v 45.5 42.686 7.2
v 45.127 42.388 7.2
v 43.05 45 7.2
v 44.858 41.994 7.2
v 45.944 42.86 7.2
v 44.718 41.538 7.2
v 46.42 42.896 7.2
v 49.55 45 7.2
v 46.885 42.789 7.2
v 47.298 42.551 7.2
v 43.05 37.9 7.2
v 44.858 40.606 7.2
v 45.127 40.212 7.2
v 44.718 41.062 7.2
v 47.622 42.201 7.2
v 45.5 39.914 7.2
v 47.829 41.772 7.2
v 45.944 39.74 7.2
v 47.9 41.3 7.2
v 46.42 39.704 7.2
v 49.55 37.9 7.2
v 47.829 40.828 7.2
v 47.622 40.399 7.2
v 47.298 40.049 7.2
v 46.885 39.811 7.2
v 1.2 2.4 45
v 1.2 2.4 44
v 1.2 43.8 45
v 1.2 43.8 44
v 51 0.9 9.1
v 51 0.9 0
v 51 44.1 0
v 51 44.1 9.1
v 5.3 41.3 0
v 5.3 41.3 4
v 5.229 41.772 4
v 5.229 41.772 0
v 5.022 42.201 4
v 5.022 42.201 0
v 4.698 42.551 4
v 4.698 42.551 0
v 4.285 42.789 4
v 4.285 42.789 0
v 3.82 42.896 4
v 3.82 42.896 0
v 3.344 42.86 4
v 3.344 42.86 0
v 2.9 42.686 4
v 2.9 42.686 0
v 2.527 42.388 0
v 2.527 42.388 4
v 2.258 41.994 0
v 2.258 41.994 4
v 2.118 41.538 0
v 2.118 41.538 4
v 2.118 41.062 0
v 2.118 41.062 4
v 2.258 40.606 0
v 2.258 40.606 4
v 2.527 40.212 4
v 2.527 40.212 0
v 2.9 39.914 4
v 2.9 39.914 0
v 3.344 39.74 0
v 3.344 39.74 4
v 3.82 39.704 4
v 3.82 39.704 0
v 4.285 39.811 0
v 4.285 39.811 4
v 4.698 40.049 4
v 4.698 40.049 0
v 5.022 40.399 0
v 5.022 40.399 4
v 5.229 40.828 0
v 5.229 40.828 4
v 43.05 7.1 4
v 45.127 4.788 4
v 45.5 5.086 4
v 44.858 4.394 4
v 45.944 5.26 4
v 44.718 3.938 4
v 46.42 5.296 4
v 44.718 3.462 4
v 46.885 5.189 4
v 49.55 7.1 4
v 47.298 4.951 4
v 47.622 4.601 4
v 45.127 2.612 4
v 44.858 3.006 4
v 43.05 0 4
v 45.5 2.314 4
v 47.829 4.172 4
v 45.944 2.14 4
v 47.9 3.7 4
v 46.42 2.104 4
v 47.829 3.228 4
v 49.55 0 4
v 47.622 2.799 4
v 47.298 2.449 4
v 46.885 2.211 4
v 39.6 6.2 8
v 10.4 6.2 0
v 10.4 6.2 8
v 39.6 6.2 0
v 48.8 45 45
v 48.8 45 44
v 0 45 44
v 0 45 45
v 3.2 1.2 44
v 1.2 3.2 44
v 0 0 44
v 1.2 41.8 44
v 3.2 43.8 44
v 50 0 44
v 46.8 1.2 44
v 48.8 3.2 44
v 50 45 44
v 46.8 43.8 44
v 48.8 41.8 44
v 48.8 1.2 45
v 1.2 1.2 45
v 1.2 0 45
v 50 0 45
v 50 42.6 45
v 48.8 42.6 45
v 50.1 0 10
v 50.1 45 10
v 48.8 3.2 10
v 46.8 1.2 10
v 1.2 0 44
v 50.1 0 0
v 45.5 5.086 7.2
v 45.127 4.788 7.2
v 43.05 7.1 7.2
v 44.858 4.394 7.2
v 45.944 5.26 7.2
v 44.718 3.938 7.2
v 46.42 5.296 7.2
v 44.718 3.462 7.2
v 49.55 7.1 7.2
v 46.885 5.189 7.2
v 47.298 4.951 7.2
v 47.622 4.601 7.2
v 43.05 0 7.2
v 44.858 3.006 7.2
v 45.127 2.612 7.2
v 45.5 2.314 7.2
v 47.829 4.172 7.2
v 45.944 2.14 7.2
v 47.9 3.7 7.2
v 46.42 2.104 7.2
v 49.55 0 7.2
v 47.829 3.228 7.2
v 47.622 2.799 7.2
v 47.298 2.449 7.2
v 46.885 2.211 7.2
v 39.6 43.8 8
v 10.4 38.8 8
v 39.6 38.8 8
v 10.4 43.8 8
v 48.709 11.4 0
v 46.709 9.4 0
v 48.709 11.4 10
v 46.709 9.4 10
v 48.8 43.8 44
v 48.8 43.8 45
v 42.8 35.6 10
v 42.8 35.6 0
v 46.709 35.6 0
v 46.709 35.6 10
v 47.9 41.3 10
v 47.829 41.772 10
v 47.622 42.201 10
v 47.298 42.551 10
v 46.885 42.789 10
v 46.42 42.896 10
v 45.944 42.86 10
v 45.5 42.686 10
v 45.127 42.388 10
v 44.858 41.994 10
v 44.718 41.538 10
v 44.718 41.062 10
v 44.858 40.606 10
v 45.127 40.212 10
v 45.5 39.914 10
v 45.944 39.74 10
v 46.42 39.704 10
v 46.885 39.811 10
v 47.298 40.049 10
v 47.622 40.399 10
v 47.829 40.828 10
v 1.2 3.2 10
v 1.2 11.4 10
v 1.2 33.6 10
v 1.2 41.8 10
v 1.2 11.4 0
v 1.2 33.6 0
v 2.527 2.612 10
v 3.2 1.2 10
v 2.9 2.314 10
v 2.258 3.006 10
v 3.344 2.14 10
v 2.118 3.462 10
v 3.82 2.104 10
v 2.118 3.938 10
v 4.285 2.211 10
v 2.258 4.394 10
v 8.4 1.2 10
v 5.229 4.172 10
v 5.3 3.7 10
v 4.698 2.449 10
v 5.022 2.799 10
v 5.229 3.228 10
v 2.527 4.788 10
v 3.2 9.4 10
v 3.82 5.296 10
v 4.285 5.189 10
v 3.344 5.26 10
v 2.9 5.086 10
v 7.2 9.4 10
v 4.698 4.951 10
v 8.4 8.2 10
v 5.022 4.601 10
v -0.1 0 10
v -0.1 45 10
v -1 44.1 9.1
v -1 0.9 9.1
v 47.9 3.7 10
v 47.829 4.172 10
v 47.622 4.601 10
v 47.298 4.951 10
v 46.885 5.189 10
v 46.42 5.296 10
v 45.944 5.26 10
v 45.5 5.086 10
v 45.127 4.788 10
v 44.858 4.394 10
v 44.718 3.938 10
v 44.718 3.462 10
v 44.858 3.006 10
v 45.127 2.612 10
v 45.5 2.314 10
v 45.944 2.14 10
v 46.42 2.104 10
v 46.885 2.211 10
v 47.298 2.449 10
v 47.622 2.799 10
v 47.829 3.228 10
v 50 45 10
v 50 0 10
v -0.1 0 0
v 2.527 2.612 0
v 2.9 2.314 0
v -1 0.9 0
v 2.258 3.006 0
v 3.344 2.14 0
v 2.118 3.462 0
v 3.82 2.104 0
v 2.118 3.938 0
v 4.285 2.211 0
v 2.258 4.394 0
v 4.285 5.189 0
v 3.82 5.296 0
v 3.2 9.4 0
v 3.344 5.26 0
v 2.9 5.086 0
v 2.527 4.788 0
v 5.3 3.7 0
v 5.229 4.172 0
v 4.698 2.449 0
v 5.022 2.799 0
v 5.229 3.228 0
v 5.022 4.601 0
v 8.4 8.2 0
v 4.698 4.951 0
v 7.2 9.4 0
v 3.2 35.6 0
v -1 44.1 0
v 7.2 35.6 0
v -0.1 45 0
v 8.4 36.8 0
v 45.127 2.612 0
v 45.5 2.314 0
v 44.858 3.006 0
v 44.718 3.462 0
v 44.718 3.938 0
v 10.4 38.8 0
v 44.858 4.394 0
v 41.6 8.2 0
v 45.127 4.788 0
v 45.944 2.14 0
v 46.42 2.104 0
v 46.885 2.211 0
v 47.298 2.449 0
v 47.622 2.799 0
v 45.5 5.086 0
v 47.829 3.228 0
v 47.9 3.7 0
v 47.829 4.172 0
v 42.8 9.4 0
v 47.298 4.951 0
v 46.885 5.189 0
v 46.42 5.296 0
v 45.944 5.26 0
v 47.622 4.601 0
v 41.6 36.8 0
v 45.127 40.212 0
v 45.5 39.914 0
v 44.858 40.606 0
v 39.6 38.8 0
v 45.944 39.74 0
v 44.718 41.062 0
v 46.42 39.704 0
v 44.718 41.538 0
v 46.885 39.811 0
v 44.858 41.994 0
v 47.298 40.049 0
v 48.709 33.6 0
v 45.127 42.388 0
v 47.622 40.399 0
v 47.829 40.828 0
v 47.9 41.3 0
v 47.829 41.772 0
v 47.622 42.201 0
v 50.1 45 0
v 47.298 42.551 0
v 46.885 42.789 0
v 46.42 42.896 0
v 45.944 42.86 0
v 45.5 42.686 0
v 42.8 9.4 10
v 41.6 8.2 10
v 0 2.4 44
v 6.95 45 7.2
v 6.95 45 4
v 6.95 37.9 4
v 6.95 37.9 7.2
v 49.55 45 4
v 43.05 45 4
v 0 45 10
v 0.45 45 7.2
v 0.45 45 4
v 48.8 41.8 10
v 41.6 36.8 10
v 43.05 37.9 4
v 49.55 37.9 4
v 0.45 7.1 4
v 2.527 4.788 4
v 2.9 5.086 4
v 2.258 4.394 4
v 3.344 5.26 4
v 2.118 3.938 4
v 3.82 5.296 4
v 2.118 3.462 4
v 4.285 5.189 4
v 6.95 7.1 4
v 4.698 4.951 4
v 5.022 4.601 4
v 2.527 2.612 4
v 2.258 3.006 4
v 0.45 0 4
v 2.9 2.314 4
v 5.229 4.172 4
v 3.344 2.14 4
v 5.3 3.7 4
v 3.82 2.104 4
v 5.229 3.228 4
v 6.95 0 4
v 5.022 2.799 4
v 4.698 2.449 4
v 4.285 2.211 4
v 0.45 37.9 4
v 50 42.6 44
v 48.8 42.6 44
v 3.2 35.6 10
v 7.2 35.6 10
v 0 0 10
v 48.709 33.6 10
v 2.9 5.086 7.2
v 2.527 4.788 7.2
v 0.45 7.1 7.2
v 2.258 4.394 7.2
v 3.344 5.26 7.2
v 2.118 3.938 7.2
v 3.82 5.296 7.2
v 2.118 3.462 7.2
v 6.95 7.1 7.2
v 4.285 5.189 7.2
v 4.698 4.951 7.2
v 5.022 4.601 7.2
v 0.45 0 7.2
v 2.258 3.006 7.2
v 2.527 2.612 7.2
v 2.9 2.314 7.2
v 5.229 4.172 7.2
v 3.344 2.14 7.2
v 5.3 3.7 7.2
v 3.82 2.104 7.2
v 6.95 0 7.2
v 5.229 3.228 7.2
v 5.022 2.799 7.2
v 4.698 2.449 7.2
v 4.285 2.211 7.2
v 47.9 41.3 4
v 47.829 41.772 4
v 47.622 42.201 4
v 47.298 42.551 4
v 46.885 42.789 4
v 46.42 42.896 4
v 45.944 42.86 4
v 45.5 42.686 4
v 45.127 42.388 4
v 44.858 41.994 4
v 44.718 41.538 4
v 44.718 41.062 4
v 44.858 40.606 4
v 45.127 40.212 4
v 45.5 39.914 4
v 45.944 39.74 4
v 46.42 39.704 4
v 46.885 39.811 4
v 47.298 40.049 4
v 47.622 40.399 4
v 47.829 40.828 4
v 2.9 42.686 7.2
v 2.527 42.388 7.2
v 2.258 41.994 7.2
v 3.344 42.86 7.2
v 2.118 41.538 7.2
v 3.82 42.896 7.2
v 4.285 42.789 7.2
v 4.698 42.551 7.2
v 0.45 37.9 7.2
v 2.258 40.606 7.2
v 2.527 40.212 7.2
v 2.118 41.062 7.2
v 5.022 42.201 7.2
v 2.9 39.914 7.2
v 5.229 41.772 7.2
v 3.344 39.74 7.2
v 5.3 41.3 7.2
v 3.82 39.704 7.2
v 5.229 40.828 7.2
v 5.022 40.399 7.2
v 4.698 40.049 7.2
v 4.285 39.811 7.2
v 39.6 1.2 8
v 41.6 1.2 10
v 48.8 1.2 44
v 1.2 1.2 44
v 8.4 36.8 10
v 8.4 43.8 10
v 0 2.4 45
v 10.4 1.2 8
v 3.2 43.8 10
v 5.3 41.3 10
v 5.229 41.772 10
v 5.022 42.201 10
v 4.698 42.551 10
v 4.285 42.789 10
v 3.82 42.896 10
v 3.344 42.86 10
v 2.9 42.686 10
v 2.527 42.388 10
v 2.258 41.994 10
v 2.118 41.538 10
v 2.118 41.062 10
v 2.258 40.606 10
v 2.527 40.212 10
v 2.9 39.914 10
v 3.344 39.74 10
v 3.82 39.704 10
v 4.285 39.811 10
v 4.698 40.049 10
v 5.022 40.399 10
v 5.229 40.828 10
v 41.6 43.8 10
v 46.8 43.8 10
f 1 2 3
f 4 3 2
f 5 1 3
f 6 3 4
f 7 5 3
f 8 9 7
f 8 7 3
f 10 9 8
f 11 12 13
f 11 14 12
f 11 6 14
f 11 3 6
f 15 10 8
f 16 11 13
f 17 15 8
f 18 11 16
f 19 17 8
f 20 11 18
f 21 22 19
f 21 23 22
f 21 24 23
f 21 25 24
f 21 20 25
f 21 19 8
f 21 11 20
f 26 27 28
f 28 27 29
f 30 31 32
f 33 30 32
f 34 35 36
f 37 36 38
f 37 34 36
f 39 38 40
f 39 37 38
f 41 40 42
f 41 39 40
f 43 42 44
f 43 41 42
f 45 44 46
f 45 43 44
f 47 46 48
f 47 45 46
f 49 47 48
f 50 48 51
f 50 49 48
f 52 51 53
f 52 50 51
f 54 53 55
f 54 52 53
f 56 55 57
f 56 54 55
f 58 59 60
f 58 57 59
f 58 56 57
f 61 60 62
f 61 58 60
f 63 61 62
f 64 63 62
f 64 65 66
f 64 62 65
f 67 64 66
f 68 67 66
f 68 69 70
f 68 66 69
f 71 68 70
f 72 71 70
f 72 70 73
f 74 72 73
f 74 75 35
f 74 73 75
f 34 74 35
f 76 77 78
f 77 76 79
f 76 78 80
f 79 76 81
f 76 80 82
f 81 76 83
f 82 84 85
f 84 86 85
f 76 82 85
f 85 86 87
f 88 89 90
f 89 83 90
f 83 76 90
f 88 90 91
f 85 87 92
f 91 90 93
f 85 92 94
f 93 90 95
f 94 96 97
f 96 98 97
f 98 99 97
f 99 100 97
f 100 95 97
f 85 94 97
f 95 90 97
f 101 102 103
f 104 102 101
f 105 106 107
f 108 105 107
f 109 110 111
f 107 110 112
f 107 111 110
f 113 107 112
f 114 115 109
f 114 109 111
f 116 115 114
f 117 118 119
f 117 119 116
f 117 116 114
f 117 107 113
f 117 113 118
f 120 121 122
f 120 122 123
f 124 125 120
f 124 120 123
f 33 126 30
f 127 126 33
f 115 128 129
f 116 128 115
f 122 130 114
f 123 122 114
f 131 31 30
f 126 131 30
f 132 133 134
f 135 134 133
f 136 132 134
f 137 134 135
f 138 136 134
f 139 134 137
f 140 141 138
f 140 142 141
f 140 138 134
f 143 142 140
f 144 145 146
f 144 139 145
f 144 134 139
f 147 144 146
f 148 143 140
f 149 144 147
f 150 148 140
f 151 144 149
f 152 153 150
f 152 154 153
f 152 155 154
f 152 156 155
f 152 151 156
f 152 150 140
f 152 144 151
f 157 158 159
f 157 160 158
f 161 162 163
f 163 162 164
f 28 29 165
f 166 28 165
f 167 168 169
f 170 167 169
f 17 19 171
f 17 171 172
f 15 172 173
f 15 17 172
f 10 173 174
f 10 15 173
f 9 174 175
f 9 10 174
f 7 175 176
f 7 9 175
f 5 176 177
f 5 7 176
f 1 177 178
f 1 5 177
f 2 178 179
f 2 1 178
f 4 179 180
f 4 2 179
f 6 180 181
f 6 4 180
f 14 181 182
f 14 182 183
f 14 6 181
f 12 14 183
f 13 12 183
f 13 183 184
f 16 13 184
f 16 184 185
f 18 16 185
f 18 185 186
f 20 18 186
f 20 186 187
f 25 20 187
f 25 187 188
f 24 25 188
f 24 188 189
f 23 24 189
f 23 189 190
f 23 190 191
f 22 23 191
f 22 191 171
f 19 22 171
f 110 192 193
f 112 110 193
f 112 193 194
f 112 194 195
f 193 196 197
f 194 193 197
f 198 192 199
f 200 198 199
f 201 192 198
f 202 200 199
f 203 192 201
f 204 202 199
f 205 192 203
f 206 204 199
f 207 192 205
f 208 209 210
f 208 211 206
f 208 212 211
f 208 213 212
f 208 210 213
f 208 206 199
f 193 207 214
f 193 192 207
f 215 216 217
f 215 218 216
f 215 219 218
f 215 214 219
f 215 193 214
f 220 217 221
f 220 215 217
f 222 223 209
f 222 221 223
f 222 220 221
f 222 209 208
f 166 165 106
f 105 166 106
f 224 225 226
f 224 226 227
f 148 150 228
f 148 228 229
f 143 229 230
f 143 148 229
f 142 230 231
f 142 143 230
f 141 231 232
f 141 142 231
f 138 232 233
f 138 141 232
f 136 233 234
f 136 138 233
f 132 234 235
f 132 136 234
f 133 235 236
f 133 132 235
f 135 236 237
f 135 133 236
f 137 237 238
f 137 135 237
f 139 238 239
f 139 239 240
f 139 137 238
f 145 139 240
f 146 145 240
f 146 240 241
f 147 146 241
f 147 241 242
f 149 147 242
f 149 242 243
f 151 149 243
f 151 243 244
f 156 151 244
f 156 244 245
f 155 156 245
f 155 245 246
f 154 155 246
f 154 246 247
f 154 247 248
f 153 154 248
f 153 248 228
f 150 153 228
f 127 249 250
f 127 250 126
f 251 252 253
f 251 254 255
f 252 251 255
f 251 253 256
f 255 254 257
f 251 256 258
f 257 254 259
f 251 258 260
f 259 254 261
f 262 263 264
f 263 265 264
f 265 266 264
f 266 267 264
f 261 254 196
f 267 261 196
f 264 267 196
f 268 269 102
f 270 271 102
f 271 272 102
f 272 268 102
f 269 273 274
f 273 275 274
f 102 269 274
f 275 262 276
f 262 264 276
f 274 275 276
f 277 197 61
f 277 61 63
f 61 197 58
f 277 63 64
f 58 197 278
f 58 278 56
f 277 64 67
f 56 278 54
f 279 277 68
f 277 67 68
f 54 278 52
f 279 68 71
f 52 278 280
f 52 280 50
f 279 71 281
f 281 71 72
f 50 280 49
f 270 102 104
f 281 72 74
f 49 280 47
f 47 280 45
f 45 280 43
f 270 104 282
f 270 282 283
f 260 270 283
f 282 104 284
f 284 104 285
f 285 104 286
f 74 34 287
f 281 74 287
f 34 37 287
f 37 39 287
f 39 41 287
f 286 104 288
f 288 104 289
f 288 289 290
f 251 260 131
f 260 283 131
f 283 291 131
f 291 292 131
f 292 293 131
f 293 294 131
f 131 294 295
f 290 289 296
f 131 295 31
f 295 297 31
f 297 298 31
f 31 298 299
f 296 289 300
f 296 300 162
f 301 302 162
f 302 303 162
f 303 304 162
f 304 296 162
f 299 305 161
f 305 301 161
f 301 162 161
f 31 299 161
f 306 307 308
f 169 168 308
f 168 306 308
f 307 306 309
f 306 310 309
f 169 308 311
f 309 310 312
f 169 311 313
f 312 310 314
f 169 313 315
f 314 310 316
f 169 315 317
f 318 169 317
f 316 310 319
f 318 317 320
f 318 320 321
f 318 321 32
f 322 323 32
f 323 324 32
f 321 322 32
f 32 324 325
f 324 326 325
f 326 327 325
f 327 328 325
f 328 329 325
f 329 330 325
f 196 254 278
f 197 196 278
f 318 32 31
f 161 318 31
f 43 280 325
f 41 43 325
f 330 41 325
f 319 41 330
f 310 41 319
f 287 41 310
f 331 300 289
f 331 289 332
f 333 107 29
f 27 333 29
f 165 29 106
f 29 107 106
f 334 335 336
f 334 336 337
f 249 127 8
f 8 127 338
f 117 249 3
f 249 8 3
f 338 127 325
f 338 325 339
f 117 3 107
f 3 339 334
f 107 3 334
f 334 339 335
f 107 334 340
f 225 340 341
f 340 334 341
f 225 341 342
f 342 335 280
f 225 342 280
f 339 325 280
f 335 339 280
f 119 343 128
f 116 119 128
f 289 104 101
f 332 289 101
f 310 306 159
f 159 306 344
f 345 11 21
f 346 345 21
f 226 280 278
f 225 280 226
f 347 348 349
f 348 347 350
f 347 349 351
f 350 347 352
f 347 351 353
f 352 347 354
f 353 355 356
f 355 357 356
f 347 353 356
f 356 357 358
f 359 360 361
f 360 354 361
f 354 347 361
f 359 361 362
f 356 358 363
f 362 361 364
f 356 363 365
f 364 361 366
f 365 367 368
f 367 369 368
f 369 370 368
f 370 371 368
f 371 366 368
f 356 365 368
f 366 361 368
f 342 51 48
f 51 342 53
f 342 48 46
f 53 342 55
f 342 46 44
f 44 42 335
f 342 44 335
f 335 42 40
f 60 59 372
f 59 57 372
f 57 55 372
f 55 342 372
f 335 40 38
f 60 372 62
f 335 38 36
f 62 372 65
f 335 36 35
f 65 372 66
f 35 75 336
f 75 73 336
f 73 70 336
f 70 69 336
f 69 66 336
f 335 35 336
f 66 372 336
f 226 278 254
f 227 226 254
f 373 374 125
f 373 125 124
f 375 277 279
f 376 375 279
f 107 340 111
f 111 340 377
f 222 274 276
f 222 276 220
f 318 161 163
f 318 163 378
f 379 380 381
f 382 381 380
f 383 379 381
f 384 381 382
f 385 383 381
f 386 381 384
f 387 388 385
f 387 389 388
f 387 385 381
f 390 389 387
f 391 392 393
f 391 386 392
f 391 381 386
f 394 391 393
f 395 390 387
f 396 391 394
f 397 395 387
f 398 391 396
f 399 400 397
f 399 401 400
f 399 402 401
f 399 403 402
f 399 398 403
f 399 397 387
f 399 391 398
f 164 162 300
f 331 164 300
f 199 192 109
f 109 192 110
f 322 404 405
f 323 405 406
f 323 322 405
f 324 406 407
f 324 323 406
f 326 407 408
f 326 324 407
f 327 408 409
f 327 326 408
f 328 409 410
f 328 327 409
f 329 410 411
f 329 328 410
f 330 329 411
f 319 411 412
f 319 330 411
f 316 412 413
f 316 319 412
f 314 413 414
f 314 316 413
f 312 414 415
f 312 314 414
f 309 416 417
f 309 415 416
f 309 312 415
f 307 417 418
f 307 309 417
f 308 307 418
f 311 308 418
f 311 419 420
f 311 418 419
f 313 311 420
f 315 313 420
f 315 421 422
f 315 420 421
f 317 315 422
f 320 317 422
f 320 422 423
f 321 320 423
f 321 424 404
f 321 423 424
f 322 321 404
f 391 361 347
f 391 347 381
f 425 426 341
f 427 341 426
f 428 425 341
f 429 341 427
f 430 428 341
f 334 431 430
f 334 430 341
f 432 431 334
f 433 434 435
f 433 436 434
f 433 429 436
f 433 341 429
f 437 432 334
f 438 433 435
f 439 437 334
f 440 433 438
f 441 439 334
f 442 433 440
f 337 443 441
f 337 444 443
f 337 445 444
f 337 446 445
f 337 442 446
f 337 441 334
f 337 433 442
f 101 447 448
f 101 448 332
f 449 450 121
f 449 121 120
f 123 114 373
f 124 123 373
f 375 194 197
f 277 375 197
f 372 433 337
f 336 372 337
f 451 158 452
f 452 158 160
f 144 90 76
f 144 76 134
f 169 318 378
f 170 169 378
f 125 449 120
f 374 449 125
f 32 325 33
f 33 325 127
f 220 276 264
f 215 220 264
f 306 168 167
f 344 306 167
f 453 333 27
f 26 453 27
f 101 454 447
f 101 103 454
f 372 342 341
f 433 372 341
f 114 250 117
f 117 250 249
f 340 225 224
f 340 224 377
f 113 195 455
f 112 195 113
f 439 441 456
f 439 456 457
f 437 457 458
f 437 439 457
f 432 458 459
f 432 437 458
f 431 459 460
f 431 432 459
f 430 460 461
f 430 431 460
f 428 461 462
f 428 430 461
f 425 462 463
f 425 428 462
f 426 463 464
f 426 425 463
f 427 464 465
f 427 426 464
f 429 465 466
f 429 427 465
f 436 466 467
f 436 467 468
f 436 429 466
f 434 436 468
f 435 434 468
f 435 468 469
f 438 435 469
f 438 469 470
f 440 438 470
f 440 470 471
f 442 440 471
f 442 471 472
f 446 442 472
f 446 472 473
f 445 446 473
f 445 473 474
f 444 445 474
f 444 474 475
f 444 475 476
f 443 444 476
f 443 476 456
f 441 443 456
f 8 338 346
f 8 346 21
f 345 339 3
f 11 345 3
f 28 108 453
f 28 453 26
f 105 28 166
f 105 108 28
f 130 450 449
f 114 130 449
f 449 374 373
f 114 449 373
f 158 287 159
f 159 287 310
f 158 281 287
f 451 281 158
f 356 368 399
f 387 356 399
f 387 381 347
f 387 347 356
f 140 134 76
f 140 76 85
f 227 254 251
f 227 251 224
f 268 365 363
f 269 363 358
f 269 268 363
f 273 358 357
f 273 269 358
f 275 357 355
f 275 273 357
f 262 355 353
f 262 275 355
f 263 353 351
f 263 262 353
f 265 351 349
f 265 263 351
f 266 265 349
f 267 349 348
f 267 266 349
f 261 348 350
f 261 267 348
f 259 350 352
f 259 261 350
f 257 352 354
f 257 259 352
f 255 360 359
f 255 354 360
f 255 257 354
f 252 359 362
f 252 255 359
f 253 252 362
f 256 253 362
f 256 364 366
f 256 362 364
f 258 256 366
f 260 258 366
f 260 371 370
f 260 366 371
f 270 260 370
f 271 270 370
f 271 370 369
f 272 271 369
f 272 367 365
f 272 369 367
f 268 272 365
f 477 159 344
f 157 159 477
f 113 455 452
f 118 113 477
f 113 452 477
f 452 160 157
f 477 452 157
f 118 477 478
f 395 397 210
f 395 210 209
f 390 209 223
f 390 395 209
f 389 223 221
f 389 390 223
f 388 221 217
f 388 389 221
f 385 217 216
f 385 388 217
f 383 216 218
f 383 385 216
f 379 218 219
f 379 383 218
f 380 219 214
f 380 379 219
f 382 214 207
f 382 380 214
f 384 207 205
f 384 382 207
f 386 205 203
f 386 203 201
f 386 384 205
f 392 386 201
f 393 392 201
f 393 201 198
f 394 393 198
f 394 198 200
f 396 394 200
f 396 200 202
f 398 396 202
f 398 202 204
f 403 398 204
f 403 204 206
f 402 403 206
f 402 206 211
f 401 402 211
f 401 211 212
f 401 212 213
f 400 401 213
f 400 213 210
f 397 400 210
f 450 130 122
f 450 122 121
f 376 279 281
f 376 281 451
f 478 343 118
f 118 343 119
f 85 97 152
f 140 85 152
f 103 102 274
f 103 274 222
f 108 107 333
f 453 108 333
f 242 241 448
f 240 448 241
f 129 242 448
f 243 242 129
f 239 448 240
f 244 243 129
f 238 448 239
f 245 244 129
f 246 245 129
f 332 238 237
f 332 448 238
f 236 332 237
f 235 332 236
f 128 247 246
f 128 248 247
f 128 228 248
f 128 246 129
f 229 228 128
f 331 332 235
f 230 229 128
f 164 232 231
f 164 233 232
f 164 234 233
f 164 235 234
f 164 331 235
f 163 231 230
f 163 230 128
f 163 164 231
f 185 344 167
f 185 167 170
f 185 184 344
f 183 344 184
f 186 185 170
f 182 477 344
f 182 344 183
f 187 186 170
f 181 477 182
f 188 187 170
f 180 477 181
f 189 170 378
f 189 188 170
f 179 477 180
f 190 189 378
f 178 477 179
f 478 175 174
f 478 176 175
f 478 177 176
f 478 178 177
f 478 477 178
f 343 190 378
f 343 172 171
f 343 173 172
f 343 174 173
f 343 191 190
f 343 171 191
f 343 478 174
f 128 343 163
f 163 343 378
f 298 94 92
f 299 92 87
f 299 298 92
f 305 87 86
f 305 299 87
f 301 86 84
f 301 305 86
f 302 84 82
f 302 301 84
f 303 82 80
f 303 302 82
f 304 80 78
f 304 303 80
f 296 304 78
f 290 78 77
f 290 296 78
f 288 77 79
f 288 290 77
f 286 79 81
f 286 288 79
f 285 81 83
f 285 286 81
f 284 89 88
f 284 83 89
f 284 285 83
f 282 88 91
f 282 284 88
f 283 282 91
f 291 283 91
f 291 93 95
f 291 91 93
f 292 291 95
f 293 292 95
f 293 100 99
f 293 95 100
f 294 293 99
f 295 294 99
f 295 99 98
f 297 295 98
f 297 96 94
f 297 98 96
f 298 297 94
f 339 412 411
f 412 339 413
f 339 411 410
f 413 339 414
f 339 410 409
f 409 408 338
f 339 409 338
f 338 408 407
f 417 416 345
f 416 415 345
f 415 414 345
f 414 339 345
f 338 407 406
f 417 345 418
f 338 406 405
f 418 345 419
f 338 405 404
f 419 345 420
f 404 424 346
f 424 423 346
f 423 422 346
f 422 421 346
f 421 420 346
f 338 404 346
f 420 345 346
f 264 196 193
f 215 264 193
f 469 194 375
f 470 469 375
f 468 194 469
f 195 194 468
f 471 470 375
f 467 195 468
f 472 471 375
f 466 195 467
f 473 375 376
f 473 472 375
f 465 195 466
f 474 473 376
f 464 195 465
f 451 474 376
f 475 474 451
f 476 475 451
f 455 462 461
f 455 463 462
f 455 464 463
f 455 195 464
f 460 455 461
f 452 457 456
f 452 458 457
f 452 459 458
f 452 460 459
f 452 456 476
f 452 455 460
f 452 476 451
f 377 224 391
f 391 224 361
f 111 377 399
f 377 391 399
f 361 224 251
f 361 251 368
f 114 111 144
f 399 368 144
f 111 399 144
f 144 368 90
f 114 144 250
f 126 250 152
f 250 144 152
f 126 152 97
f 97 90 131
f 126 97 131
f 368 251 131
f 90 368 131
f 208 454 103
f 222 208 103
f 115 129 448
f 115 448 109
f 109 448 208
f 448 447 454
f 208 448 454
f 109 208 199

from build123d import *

# Parameters (mm, degrees)
F0_W      = 47.6
F0_H      = 1.2
F0_W_2    = 1.2
F0_H_2    = 42.6
F1_DEPTH  = 44
F2_R      = 1.6
F2_W      = 1.4791749234
F2_H      = 26.2
F2_W_2    = 2.291076839
F3_DEPTH  = 10
F4_W      = 6.5
F4_H      = 3.2
F5_DEPTH  = 7.1
F6_START  = -37.9
F6_DEPTH  = 7.1
F7_SIZE   = 0.9
F8_W      = 47.6
F8_H      = 1.2
F8_W_2    = 1.2
F8_H_2    = 41.4
F9_DEPTH  = 1
F10_W     = 33.2
F10_H     = 5
F11_DEPTH = 8
F12_SIZE  = 1.99999
F13_SIZE  = 2
F14_SIZE  = 1.2


# Not quite as in the source:
# - a fillet or chamfer is up to 0.001 mm smaller than in the source, because OpenCascade refuses the exact size


with BuildPart() as f1:
    # F0 (on Top) → F1 (new body)
    with BuildSketch(Plane.XY):
        with Locations((25, 44.4)):
            Rectangle(F0_W, F0_H)
        with Locations((49.4, 44.4)):
            Rectangle(F0_W_2, F0_H)
        with Locations((49.4, 22.5)):
            Rectangle(F0_W_2, F0_H_2)
        with Locations((49.4, 0.6)):
            Rectangle(F0_W_2, F0_H)
        with Locations((25, 0.6)):
            Rectangle(F0_W, F0_H)
        with Locations((0.6, 0.6)):
            Rectangle(F0_W_2, F0_H)
        with Locations((0.6, 22.5)):
            Rectangle(F0_W_2, F0_H_2)
        with Locations((0.6, 44.4)):
            Rectangle(F0_W_2, F0_H)
    extrude(amount=F1_DEPTH)

    # F2 (on face) → F3 (join)
    with BuildSketch(Plane.XY):
        Polygon((-1, 9.4), (-1, 0), (8.4, 0), (8.4, 9.4), (0.4791749234, 9.4), align=None)
        with Locations((3.7, 3.7)):
            Circle(F2_R, mode=Mode.SUBTRACT)
        with Locations((-0.2604125383, 22.5)):
            Rectangle(F2_W, F2_H)
        Polygon((-1, 45), (-1, 35.6), (0.4791749234, 35.6), (8.4, 35.6), (8.4, 45), align=None)
        with Locations((3.7, 41.3)):
            Circle(F2_R, mode=Mode.SUBTRACT)
        Polygon((41.6, 9.4), (41.6, 0), (51, 0), (51, 9.4), (48.708923161, 9.4), align=None)
        with Locations((46.3, 3.7)):
            Circle(F2_R, mode=Mode.SUBTRACT)
        with Locations((49.8544615805, 22.5)):
            Rectangle(F2_W_2, F2_H)
        Polygon((41.6, 35.6), (48.708923161, 35.6), (51, 35.6), (51, 45), (41.6, 45), align=None)
        with Locations((46.3, 41.3)):
            Circle(F2_R, mode=Mode.SUBTRACT)
    extrude(amount=F3_DEPTH)

    # F4 (on face) → F5 (cut)
    with BuildSketch(Plane.XZ):
        with Locations((3.7, 5.6)):
            Rectangle(F4_W, F4_H)
        with Locations((46.3, 5.6)):
            Rectangle(F4_W, F4_H)
    extrude(amount=-F5_DEPTH, mode=Mode.SUBTRACT)

    # F4 (on face) → F6 (cut)
    with BuildSketch(Plane.XZ.offset(F6_START)):
        with Locations((3.7, 5.6)):
            Rectangle(F4_W, F4_H)
        with Locations((46.3, 5.6)):
            Rectangle(F4_W, F4_H)
    extrude(amount=-F6_DEPTH, mode=Mode.SUBTRACT)

    # F7
    f7_edges = [f1.edges().sort_by_distance(p)[0] for p in [
        (-1, 45, 5),
        (-1, 22.5, 10),
        (51, 22.5, 10),
        (-1, 0, 5),
        (51, 0, 5),
        (51, 45, 5),
    ]]
    chamfer(f7_edges, length=F7_SIZE)

    # F10 (on face) → F11 (join)
    with BuildSketch(Plane.XY):
        with Locations((25, 41.3)):
            Rectangle(F10_W, F10_H)
        with Locations((25, 3.7)):
            Rectangle(F10_W, F10_H)
    extrude(amount=F11_DEPTH)

    # F12 (size 2 in the source; OpenCascade refuses exactly that, so slightly less here)
    f12_edges = [f1.edges().sort_by_distance(p)[0] for p in [
        (8.4, 41.3, 8),
        (41.6, 41.3, 8),
        (41.6, 38.8, 4),
        (8.4, 38.8, 4),
        (41.6, 6.2, 4),
        (41.6, 3.7, 8),
        (8.4, 3.7, 8),
        (8.4, 6.2, 4),
        (1.2, 35.6, 5),
        (48.708923, 35.6, 5),
        (48.708923, 9.4, 5),
        (1.2, 9.4, 5),
    ]]
    chamfer(f12_edges, length=F12_SIZE)

    # F13
    f13_edges = [f1.edges().sort_by_distance(p)[0] for p in [
        (48.8, 43.8, 27),
        (1.2, 43.8, 27),
        (1.2, 1.2, 27),
        (48.8, 1.2, 27),
    ]]
    chamfer(f13_edges, length=F13_SIZE)

    # F14
    f14_edges = [f1.edges().sort_by_distance(p)[0] for p in [
        (8.4, 35.6, 5),
        (41.6, 35.6, 5),
        (41.6, 9.4, 5),
        (8.4, 9.4, 5),
    ]]
    chamfer(f14_edges, length=F14_SIZE)


with BuildPart() as f9:
    # F8 (on face) → F9 (new body)
    with BuildSketch(Plane.XY.offset(44)):
        with Locations((25, 44.4)):
            Rectangle(F8_W, F8_H)
        with Locations((0.6, 23.1)):
            Rectangle(F8_W_2, F8_H_2)
        with Locations((0.6, 44.4)):
            Rectangle(F8_W_2, F8_H)
    extrude(amount=F9_DEPTH)


with BuildPart() as f9b:
    # F8 (on face) → F9, piece 2 (new body)
    with BuildSketch(Plane.XY.offset(44)):
        with Locations((49.4, 21.9)):
            Rectangle(F8_W_2, F8_H_2)
        with Locations((25, 0.6)):
            Rectangle(F8_W, F8_H)
        with Locations((49.4, 0.6)):
            Rectangle(F8_W_2, F8_H)
    extrude(amount=F9_DEPTH)


solid = Compound([f1.part, f9.part, f9b.part])
